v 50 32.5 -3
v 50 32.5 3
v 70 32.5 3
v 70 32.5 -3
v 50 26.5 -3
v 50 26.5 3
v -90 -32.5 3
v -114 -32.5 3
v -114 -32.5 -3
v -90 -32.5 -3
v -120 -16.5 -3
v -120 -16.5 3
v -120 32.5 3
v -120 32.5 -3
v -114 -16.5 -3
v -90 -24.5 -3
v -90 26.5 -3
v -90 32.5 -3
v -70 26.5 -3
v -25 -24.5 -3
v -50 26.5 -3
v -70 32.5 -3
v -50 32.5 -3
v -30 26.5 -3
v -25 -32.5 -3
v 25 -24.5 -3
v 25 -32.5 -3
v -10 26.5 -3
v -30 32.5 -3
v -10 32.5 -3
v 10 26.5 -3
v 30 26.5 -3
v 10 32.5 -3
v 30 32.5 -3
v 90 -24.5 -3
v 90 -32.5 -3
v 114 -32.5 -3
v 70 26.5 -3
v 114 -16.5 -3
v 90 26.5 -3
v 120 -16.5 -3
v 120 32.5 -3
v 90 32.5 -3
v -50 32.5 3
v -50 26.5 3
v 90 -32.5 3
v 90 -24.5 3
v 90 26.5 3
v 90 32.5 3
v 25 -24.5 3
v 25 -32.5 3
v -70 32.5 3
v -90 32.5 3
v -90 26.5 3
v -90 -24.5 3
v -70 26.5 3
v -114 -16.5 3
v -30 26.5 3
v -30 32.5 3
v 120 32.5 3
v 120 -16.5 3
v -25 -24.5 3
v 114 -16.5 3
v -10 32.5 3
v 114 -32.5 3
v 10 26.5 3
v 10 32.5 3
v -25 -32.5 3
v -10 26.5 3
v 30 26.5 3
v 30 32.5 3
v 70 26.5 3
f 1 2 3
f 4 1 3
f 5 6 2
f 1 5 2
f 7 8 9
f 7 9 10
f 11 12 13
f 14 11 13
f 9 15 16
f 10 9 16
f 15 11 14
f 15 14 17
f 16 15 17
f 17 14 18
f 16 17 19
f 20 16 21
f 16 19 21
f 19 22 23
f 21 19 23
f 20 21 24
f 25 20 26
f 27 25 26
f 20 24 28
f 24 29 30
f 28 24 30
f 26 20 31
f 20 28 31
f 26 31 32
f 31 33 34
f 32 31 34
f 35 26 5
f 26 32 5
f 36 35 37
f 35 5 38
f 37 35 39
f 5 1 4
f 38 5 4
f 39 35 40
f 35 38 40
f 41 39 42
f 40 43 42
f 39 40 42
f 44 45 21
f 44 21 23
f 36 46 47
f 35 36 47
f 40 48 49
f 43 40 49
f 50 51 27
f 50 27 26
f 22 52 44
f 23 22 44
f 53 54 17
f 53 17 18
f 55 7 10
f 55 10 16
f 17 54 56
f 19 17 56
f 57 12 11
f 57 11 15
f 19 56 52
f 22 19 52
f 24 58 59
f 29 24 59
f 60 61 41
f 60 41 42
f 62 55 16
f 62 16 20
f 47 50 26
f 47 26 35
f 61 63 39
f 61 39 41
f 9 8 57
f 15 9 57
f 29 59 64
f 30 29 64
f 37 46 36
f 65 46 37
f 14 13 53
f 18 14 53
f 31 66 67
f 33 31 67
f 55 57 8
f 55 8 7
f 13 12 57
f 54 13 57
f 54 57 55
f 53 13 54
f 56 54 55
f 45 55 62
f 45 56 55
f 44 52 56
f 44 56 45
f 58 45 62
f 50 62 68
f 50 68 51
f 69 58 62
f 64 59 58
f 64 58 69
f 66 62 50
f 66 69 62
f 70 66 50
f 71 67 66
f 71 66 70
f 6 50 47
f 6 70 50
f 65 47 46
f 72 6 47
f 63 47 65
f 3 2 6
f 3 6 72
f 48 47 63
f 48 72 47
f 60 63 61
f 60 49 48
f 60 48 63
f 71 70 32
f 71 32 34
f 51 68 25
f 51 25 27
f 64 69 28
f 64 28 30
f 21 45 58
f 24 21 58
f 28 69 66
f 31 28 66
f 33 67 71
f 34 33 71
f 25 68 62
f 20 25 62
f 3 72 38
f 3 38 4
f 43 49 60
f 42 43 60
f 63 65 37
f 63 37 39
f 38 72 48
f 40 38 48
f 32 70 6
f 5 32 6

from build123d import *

# Parameters (mm, degrees)
SKETCH1_W           = 240
SKETCH1_H           = 65
BOSS_EXTRUDE1_DEPTH = 3
SKETCH2_W           = 6
SKETCH2_H           = 16
SKETCH2_W_2         = 65
SKETCH2_H_2         = 8
CUT_EXTRUDE1_DEPTH  = 6
SKETCH3_W           = 20
SKETCH3_H           = 6
CUT_EXTRUDE2_DEPTH  = 6


with BuildPart() as part:
    # Sketch1 → Boss-Extrude1 (new body, symmetric)
    with BuildSketch(Plane.XY):
        Rectangle(SKETCH1_W, SKETCH1_H)
    extrude(amount=BOSS_EXTRUDE1_DEPTH, both=True)

    # Sketch2 → Cut-Extrude1 (cut)
    with BuildSketch(Plane.XY.offset(3)):
        with Locations((-117, -24.5)):
            Rectangle(SKETCH2_W, SKETCH2_H)
        with Locations((-57.5, -28.5)):
            Rectangle(SKETCH2_W_2, SKETCH2_H_2)
        with Locations((57.5, -28.5)):
            Rectangle(SKETCH2_W_2, SKETCH2_H_2)
        with Locations((117, -24.5)):
            Rectangle(SKETCH2_W, SKETCH2_H)
    extrude(amount=-CUT_EXTRUDE1_DEPTH, mode=Mode.SUBTRACT)

    # Sketch3 → Cut-Extrude2 (cut)
    with BuildSketch(Plane.XY.offset(3)):
        with Locations((-80, 29.5)):
            Rectangle(SKETCH3_W, SKETCH3_H)
        with Locations((-40, 29.5)):
            Rectangle(SKETCH3_W, SKETCH3_H)
        with Locations((0, 29.5)):
            Rectangle(SKETCH3_W, SKETCH3_H)
        with Locations((40, 29.5)):
            Rectangle(SKETCH3_W, SKETCH3_H)
        with Locations((80, 29.5)):
            Rectangle(SKETCH3_W, SKETCH3_H)
    extrude(amount=-CUT_EXTRUDE2_DEPTH, mode=Mode.SUBTRACT)


solid = part.part
